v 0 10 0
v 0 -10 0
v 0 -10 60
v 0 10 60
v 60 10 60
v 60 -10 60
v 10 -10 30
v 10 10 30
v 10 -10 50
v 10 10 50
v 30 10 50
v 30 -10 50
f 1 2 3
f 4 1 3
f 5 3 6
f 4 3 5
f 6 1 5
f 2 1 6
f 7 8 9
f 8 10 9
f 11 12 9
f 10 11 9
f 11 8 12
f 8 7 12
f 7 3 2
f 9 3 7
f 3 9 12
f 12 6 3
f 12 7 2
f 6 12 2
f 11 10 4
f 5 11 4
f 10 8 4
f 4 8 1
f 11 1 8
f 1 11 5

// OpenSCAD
$fn=40;

polyhedron
    (points = [
	       [0, -10, 60], [0, 10, 60], [0, 10, 0], [0, -10, 0], [60, -10, 60], [60, 10, 60], 
	       [10, -10, 50], [10, 10, 50], [10, 10, 30], [10, -10, 30], [30, -10, 50], [30, 10, 50]
	       ], 
     faces = [
		  [0,3,2],  [0,2,1],  [4,0,5],  [5,0,1],  [5,2,4],  [4,2,3],
                  [6,8,9],  [6,7,8],  [6,10,11],[6,11,7], [10,8,11],
		  [10,9,8], [3,0,9],  [9,0,6],  [10,6, 0],[0,4,10],
                  [3,9,10], [3,10,4], [1,7,11], [1,11,5], [1,8,7],  
                  [2,8,1],  [8,2,11], [5,11,2]
		  ]
     );
